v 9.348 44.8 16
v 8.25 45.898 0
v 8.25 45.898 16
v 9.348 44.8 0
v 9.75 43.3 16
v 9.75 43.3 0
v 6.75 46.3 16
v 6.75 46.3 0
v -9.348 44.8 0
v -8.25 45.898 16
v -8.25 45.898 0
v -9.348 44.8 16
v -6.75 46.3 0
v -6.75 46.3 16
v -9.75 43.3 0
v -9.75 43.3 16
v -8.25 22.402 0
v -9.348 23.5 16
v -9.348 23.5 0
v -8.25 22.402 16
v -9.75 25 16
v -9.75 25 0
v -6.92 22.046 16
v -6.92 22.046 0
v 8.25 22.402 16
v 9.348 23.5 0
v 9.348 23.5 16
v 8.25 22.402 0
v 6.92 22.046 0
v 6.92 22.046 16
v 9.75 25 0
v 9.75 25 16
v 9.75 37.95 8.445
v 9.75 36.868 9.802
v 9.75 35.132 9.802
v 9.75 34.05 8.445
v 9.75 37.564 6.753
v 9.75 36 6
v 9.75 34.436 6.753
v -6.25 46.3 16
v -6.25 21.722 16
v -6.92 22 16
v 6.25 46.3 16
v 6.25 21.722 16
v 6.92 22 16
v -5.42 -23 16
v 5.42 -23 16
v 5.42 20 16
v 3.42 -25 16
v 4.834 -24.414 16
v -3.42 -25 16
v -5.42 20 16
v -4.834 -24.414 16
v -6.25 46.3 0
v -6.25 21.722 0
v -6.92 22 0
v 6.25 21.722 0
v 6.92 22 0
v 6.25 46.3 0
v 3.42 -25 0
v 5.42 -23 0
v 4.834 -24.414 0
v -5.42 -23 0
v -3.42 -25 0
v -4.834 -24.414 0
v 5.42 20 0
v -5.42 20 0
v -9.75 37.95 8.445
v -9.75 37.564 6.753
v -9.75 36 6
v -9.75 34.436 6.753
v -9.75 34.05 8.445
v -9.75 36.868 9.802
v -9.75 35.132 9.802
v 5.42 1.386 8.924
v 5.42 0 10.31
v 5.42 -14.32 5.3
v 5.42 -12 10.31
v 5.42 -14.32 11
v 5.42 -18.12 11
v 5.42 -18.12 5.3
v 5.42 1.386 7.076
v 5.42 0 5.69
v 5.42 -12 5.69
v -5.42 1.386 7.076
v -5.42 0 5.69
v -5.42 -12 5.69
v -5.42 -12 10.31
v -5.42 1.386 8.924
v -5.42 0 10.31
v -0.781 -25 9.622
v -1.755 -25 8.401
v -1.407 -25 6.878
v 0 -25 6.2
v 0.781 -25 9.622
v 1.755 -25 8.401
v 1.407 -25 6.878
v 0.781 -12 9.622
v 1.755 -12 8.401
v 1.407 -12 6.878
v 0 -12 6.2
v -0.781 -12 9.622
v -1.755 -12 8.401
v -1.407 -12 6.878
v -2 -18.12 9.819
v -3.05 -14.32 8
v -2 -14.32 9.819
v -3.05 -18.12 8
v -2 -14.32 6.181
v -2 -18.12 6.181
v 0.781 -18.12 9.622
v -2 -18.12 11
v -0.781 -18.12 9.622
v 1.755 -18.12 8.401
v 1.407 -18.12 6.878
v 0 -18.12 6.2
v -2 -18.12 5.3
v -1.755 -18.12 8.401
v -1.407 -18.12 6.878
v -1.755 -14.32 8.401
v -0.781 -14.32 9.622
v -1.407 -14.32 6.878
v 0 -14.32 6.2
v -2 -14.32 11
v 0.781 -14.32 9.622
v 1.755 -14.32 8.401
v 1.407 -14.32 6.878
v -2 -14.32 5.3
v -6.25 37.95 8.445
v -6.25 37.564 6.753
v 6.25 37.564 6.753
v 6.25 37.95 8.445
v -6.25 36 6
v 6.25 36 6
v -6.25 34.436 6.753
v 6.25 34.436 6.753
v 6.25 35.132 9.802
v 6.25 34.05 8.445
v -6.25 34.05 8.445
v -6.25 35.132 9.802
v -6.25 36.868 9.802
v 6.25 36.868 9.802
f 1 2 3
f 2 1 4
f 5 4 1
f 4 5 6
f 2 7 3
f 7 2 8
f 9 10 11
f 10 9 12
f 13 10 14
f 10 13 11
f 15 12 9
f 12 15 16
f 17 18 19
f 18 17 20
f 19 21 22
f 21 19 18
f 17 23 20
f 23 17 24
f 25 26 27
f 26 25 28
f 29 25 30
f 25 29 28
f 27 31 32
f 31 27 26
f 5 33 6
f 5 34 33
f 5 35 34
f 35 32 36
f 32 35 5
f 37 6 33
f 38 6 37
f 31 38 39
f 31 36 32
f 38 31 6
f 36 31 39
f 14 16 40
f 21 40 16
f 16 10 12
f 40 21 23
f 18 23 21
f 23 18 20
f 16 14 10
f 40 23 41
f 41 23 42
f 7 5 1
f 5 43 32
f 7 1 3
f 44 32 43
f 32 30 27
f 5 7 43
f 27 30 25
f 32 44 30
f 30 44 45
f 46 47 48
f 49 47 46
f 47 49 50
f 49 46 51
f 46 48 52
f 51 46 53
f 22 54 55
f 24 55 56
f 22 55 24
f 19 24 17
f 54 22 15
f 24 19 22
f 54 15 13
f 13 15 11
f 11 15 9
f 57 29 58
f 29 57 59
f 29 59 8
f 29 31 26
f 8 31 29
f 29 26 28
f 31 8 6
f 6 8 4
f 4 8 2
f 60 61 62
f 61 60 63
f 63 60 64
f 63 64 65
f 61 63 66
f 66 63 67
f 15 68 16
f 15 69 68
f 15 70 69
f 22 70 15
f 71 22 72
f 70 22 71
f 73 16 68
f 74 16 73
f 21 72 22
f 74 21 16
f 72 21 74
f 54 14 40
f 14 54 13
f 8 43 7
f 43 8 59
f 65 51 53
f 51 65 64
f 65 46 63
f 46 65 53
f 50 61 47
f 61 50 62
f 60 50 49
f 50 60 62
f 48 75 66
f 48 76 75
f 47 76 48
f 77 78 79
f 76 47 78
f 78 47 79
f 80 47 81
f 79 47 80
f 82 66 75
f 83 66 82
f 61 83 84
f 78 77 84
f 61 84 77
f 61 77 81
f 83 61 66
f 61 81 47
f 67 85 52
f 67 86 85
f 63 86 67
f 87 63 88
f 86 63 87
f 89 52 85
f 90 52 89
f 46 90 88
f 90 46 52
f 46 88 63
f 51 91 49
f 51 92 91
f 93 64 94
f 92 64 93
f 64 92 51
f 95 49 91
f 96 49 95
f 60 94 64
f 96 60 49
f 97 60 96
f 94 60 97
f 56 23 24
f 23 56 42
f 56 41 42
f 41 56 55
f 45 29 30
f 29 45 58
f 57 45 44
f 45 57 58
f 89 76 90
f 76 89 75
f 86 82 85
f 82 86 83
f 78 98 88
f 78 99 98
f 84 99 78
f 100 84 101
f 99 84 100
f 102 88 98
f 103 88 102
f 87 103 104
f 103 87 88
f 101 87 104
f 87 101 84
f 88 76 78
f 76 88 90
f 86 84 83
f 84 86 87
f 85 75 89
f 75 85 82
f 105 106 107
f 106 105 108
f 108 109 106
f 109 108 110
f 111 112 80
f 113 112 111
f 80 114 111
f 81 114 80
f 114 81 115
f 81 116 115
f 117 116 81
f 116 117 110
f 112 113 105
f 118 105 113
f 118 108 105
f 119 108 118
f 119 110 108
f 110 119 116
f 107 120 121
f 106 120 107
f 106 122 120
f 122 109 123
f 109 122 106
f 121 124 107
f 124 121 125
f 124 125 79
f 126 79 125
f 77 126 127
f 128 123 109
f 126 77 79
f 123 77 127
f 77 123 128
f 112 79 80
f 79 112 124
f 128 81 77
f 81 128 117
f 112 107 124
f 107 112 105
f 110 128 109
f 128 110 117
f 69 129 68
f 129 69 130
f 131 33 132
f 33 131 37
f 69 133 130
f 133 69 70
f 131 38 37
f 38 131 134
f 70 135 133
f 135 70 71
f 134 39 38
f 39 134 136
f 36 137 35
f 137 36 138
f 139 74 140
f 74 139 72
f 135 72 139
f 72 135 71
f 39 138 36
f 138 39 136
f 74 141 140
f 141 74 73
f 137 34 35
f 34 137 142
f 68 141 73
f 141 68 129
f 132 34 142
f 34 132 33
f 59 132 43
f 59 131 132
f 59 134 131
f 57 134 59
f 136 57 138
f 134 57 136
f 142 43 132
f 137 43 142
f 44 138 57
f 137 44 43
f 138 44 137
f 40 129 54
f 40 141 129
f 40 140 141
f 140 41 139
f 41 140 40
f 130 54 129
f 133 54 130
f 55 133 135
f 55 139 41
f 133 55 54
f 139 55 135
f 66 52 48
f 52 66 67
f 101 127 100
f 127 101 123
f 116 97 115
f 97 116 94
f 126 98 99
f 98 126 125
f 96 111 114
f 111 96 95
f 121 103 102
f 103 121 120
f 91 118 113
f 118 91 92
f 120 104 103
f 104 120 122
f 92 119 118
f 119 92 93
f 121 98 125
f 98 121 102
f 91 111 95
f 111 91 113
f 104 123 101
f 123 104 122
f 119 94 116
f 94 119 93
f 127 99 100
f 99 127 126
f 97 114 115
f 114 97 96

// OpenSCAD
// file: inc/settings.scad
// Moved from config.scad
//calculated from settings
single_wall_width = width_over_thickness * layer_height;
//deltas are used to enlarge parts for bigger bearings, depends on outer bushing radius
//7.7 here is outer radius of lm8uu
xy_delta = max(0, bushing_xy[1] - 7.7, bushing_carriage[1] - 7.7);
z_delta = max(0, bushing_z[1] - 7.7);
x_to_z_distance = max(bushing_xy[0],bushing_carriage[0]) + bushing_z[1] + 3;
//distance of X axis rods, center to center
xaxis_rod_distance = 45 + xy_delta * 2;

// height and width of the x blocks depend on x smooth rod radius
x_box_height = xaxis_rod_distance + 8 + 2 * bushing_xy[0];
// Pretend the smooth rods are at least 8mm diameter
x_box_width = max(8, bushing_xy[0] * 2, bushing_carriage[0] * 2) + 10;

// distance between centers of z threaded and smooth rod, in X direction
z_pair_separation = max(bushing_outer_radius(bushing_z) + 8, 18);

idler_width = max(belt_width, idler_bearing[1], 7) + 2.5 * idler_bearing[3];

//Required clearence from X axis center to board wrt carriage
carriage_thickness = max(bushing_outer_radius(bushing_xy), bushing_outer_radius(bushing_carriage));
//move the XZ plane further away from board for bigger bearings
board_to_x_distance = max(carriage_thickness, x_box_width / 2) + 2;

m3_nut_diameter_bigger = ((m3_nut_diameter / 2) / cos (180 / 6)) * 2;
idler_height=max(idler_bearing[0], 16);
// file: inc/functions.scad
// PRUSA iteration3
// Functions used in many files
// GNU GPL v3
// Josef Průša <josefprusa@me.com>
// Václav 'ax' Hůla <axtheb@gmail.com>
// Vlnofka <>
// http://www.reprap.org/wiki/Prusa_Mendel
// http://github.com/josefprusa/Prusa3


module nut(d,h,horizontal=true){
    cornerdiameter =  (d / 2) / cos (180 / 6);
    cylinder(h = h, r = cornerdiameter, $fn = 6);
    if(horizontal){
        for(i = [1:6]){
            rotate([0,0,60*i]) translate([-cornerdiameter-0.2,0,0]) rotate([0,0,-45]) cube([2,2,h]);
        }
    }
}

module fillet(radius, height=100, $fn=0) {
    //this creates acutal fillet
    translate([-radius, -radius, -height / 2 - 0.02]) difference() {
        cube([radius * 2, radius * 2, height + 0.04]);
        if ($fn == 0 && (radius == 2 || radius == 3 || radius == 4)) {
            cylinder(r=radius, h=height + 0.04, $fn=4 * radius);
        } else {
            cylinder(r=radius, h=height + 0.04, $fn=$fn);
        }

    }
}

module cube_fillet(size, radius=-1, vertical=[3,3,3,3], top=[0,0,0,0], bottom=[0,0,0,0], center=false, $fn=0){
    //
    if (use_fillets == 1) {
        if (center) {
            cube_fillet_inside(size, radius, vertical, top, bottom, $fn);
        } else {
            translate([size[0]/2, size[1]/2, size[2]/2])
                cube_fillet_inside(size, radius, vertical, top, bottom, $fn);
        }
    } else {
        if (use_fillets == 2) {
            if (center) {
                cube_fillet_inside(size, radius, vertical, top, bottom, 4);
            } else {
                translate([size[0]/2, size[1]/2, size[2]/2])
                    cube_fillet_inside(size, radius, vertical, top, bottom, 4);
            }

        } else {
            cube(size, center);
        }
    }

}

module cube_negative_fillet(size, radius=-1, vertical=[3,3,3,3], top=[0,0,0,0], bottom=[0,0,0,0], $fn=0){

    j=[1,0,1,0];

    for (i=[0:3]) {
        if (radius > -1) {
            rotate([0, 0, 90*i]) translate([size[1-j[i]]/2, size[j[i]]/2, 0]) fillet(radius, size[2], $fn=$fn);
        } else {
            rotate([0, 0, 90*i]) translate([size[1-j[i]]/2, size[j[i]]/2, 0]) fillet(vertical[i], size[2], $fn=$fn);
        }
        rotate([90*i, -90, 0]) translate([size[2]/2, size[j[i]]/2, 0 ]) fillet(top[i], size[1-j[i]], $fn=$fn);
        rotate([90*(4-i), 90, 0]) translate([size[2]/2, size[j[i]]/2, 0]) fillet(bottom[i], size[1-j[i]], $fn=$fn);

    }
}

module cube_fillet_inside(size, radius=-1, vertical=[3,3,3,3], top=[0,0,0,0], bottom=[0,0,0,0], $fn=0){
    //makes CENTERED cube with round corners
    // if you give it radius, it will fillet vertical corners.
    //othervise use vertical, top, bottom arrays
    //when viewed from top, it starts in upper right corner (+x,+y quadrant) , goes counterclockwise
    //top/bottom fillet starts in direction of Y axis and goes CCW too


    if (radius == 0) {
        cube(size, center=true);
    } else {
        difference() {
            cube(size, center=true);
            cube_negative_fillet(size, radius, vertical, top, bottom, $fn);
        }
    }
}


module nema17(places=[1,1,1,1], size=15.5, h=10, holes=false, shadow=false, $fn=24){
    for (i=[0:3]) {
        if (places[i] == 1) {
            rotate([0, 0, 90*i]) translate([size, size, 0]) {
                if (holes) {
                    rotate([0, 0, -90*i])  translate([0,0,-10]) screw(r=1.7, slant=false, head_drop=13, $fn=$fn, h=h+12);
                } else {
                    rotate([0, 0, -90*i]) cylinder(h=h, r=5.5, $fn=$fn);
                }
            }
        }
    }
    if (shadow != false) {
        %translate ([0, 0, shadow+21+3]) cube([42,42,42], center = true);
    //flange
        %translate ([0, 0, shadow+21+3-21-1]) cylinder(r=11,h=2, center = true, $fn=20);
    //shaft
        %translate ([0, 0, shadow+21+3-21-7]) cylinder(r=2.5,h=14, center = true);
    }
}

module screw(h=20, r=2, r_head=3.5, head_drop=0, slant=i_am_box, poly=false, $fn=0){
    //makes screw with head
    //for substraction as screw hole
    if (poly) {
        cylinder_poly(h=h, r=r, $fn=$fn);
    } else {
        cylinder(h=h, r=r, $fn=$fn);
    }
    if (slant) {
        translate([0, 0, head_drop-0.01]) cylinder(h=r_head, r2=0, r1=r_head, $fn=$fn);
    }

    if (head_drop > 0) {
        translate([0, 0, -0.01]) cylinder(h=head_drop+0.01, r=r_head, $fn=$fn);
    }
}

module plate_screw(long=0) {
    if (i_am_box == 0) {
        translate([0, 0, -long]) screw(head_drop=14 + long, h=30 + long, r_head=3.6, r=1.7, $fn=24, slant=false);
    } else {
        translate([0, 0, -2 - long]) screw(head_drop=14 + long, h=30 + long, r_head=4.5, r=2, $fn=24, slant=true);
    }
}

//radius of the idler assembly (to surface that touches belt, ignoring guide walls)
function idler_assy_r_inner(idler_bearing) = (idler_bearing[0] / 2) + (6 * single_wall_width + 0.2) * idler_bearing[3];
//outer radius of the idler assembly (to smooth side of belt) 
function idler_assy_r_outer(idler_bearing) = idler_assy_r_inner(idler_bearing) + belt_thickness + 1;


module idler_assy(idler_bearing = [22, 7, 8, 1]) {

    //bearing axle
    translate([0,0,-1]) cylinder(h = 120, r=(idler_bearing[2] + 1) / 2, $fn=small_hole_segments, center=true);
    //bearing shadow
    %cylinder(h = idler_bearing[1], r=idler_bearing[0]/2, center=true);
    //belt shadow
    %cylinder(h = belt_width, r=idler_assy_r_outer(idler_bearing), center=true);

    cylinder(h = idler_width + 1, r=idler_assy_r_outer(idler_bearing) + 0.5, center=true);
}

module belt(len, side = 0){
    //belt. To be substracted from model
    //len is in +Z, smooth side in +X, Y centered
    translate([-0.5, 0, 0]) maketeeth(len);
    translate([0, -4.5, -0.01]) cube([belt_thickness, 9, len + 0.02]);
    if (side != 0) {
    translate([0, -4.5 + side, -0.01]) cube_fillet([belt_thickness, 9, len + 0.02], vertical = [3, 0, 0, 0]);
    }
}


module maketeeth(len){
    //Belt teeth. 
    for (i = [0 : len / belt_tooth_distance]) {
        translate([0, 0, i * belt_tooth_distance]) cube([2, 9, belt_tooth_distance * belt_tooth_ratio], center = true);
    }
}


module cylinder_pushfit(r,h, center=false){
    //horizontal smooth hole opening
    trn = (center ? 0 : h/2);
    translate([0, 0, trn]) {
        cylinder(h=h, r=r, $fn=30, center=true);
        translate([0, -r / 2, 0]) cube_fillet([r * 2, r, h], vertical = [0, 0, 1.5, 1.5], center = true, $fn=4);
        translate([0, -r - 4 * layer_height, 0]) cube([r * 2 - 2, 1, h], center = true);
    }
}

function bushing_outer_radius(conf_b) = conf_b[1] + 4*single_wall_width;
// file: inc/conf_bushing.scad
// PRUSA iteration3
// Bushing and bering dimensions
// GNU GPL v3
// Václav 'ax' Hůla <axtheb@gmail.com>
// http://www.reprap.org/wiki/Prusa_Mendel
// http://github.com/josefprusa/Prusa3
//

// each config is in form[r_rod, r, h, type, name] where:
//     r_rod  is smooth rod radius [0]
//     r is outer bushing radius needed for tight fit or bearing radius with loose fit [1]
//     h is barrel length [2]
//     type is 0 for linear bearings, 1 is for bushings which needs to be enclosed fully. [3]
//       type 1 may have flange, but type 0 not
//     name is human readable name [4]

//bushings
conf_b_bushing8 = [4, 5.1, 10, 1, "Tube shaped bushing like igus J(V)FM 0810-10"];
conf_b_bushing10 = [5, 6.1, 10, 1, "Tube shaped bushing with id=10mm, od=12mm and length of at least 10mm, like J(V)FM 1012-10"];
conf_b_bushing12 = [6, 7.1, 15, 1, "Tube shaped bushing with id=12mm, od=14mm and length of at least 15mm, like SF-1 1215"];

conf_b_bronze8 = [4, 8, 11, 1, "bronze self-aligning bushing, 8mm"];

//shorter beaings (two on each Z axis)
conf_b_lm8uu = [4, 7.7, 24, 0, "lm8uu bearing (standard)"]; // otsakir: measured 7.47 but put some more for air 
conf_b_lm10uu = [5, 9.7, 29, 0, "lm10uu bearing (10mm smooth rod)"];
conf_b_lme8uu =[4, 8.2, 25, 0, "lme8uu bearing"];
conf_b_lm12uu = [6, 10.6, 30, 0, "lm12uu bearing (12mm smooth rod)"];

//longer bearings
conf_b_lm8luu = [4, 7.7, 45, 0, "lm8luu bearing (double length)"];
conf_b_lm10luu = [5, 9.7, 55, 0, "lm10luu bearing (10mm smooth rod, long)"];
conf_b_lm12luu = [6, 10.6, 57, 0, "lm12luu bearing (12mm, double length)"];


// Select idler bearing size **************************************************
// [outer_diameter, width, inner_diameter, uses_guide]

// roughly sorted by desirability

// one bearing with guides
// Select by availability, smaller is better.
bearing_623 = [10, 4, 3, 1, "623 bearing"];
bearing_624 = [13, 5, 4, 1, "624 bearing"];
bearing_625 = [16, 5, 5, 1, "625 bearing"];

// two bearings side by side - for use without bearing guides.
// Not recomended anymore
bearing_625_double = [16, 10, 5, 0, "625 bearing x2"];
bearing_624_double = [13, 10, 4, 0, "624 bearing x2"];
bearing_623_double = [10, 8, 3, 0, "623 bearing"];

// 608 [standard skate bearings] with bearing guide
bearing_608 = [22, 7, 8, 1, "608 bearing"];
// 608 bearings with fender washers.
// the belt brushes both against the carriage and the washers.
bearing_608_washers = [22, 10, 8, 0, "608 bearing"];
// file: inc/metric.scad
// PRUSA iteration3
// Default metric sizes
// GNU GPL v3
// Josef Průša <josefprusa@me.com>
// http://www.reprap.org/wiki/Prusa_Mendel
// http://github.com/prusajr/PrusaMendel

// DONT CHANGE THIS FILE! ALTER VALUES IN CONFIGURATION.SCAD INSTEAD

// RODS

threaded_rod_diameter = 8.7;
threaded_rod_diameter_horizontal = 8.7;
smooth_bar_diameter = 8;
smooth_bar_diameter_horizontal = 8.8;

// Nuts and bolts

m8_diameter = 9;
m8_nut_diameter = 14.1;

m4_diameter = 4.5;
m4_nut_diameter = 9;

m3_diameter = 3.6;
m3_nut_diameter = 5.3;
m3_nut_diameter_horizontal = 6.1;

// Bushing holder

bushing_core_diameter = smooth_bar_diameter;
bushing_material_thickness = 1;

// Motors

motor_shaft = 5.5;
// file: inc/bearing-guide.scad
// PRUSA iteration3
// Bearing guide
// GNU GPL v3
// Josef Průša <josefprusa@me.com>
// Václav 'ax' Hůla <axtheb@gmail.com>
// Original design by Greg Frost
// http://www.reprap.org/wiki/Prusa_Mendel
// http://github.com/prusajr/PrusaMendel


/**
 * Helps to hold belt aligned on the bearing.
 * @id bearing-guide
 * @name Bearing guide
 * @category Printed
 */

include <../configuration.scad>
include <functions.scad>

//guiding_wall_thickness of guiding wall
guiding_wall_thickness=layer_height * 3;


height = max(belt_width, idler_bearing[1]) + guiding_wall_thickness;
//How much the guiding wall overlaps the bearing wall (to the center)
wall_descent = 1;

module bearing_guide_inner(){
    //inner (smaller) part of the guide
    difference(){
        cylinder(r=idler_bearing[0] / 2 + single_wall_width * 3, h=height - (max( idler_bearing[1], belt_width) - idler_bearing[1]) / 2);
        translate([0, 0, -1])
            cylinder(r=idler_bearing[0] / 2, h=height + 2);
    }

    difference(){
        union() {
            cylinder(r=idler_assy_r_outer(idler_bearing), h=guiding_wall_thickness);  //guide wall
            cylinder(r=idler_bearing[0] / 2, h=guiding_wall_thickness + (belt_width - idler_bearing[1])/2);  //this centers the guide on bearing
        }
        translate([0,0,-1])
            cylinder(r=idler_bearing[0] / 2 - wall_descent, h=guiding_wall_thickness + 10);
    }
}

module bearing_guide_outer(){
    difference(){
        cylinder(r=idler_bearing[0] / 2 + 6 * single_wall_width + 0.2, h=height);
        translate([0,0,-1])
            cylinder(r=idler_bearing[0] / 2 + single_wall_width * 3, h=height + 2);
    }

    difference(){
        union(){
            cylinder(r=idler_assy_r_outer(idler_bearing), h=guiding_wall_thickness);
            cylinder(r=idler_bearing[0] / 2, h=guiding_wall_thickness + (belt_width - idler_bearing[1])/2);
        }
        translate([0,0,-1])
cylinder(r=idler_bearing[0]/2-wall_descent, h=height + 5);
    }
}

module bearing_assy(){

    bearing_guide_inner();
    translate([idler_assy_r_outer(idler_bearing) * 2 + 2, 0, 0])
        bearing_guide_outer();
}

bearing_assy();
// file: bushing.scad
// PRUSA Mendel  
// Bushings
// GNU GPL v3
// Josef Průša
// josefprusa@me.com
// prusadjs.cz
// http://www.reprap.org/wiki/Prusa_Mendel
// http://github.com/prusajr/PrusaMendel

include <configuration.scad>

/**
 * @id bushing
 * @name Bushing
 * @category Printed
 * @id bushing
 */ 



module bushing(stiff, lenght=11){
	difference(){
		union(){
			translate(v=[-7.5,-8,0])cube(size = [15,8,lenght]);
			cylinder(h = lenght, r=7.5);
		}
	//cutout inside
	//Opening
	rotate(a=[0,0,45]) translate(v=[1,1,-1]) cube(size = [16,16,lenght+2]);
	//Cutouts to make it more bendy
	if(stiff){
		translate(v=[-4.8,-6,-1]) cube(size = [0.8,6,lenght+2]);
		translate(v=[4,-6,-1]) cube(size = [0.8,6,lenght+2]);
	}else{
		translate(v=[-4.8,-8,-1]) cube(size = [0.8,8,lenght+2]);
		translate(v=[4,-8,-1]) cube(size = [0.8,8,lenght+2]);
	}
	translate(v=[0,5,(lenght+2)/2]) cube(size = [7,8,lenght+2], center=true);
	translate(v=[0,0,-1]) cylinder(h = lenght+2, r=5);
	}
}


module standart_bushing(){

difference(){translate(v=[0,5,8])rotate(a=[90,0,0]){
bushing(false, 10);
translate(v=[-7,-13,0])cube(size = [14,5,10]);
translate(v=[-2,-13,-3])cube(size = [4,5,16]);
translate(v=[-2,-12,-3])cube(size = [4,7.5,2]);
translate(v=[-2,-12,11])cube(size = [4,7.5,2]);
}
translate(v=[-3,-1,-16])rotate(a=[45,0,0])cube(size = [6,5,16]);

mirror([ 0, 1, 0 ]) translate(v=[-3,-1,-16])rotate(a=[45,0,0])cube(size = [6,5,16]);}
}


// Includes small cutouts for better prints
module vertical_bushing(stiff, lenght){
difference(){
bushing(stiff, lenght);
translate(v=[-5,0,-1]) cube(size = [10,2.5,lenght+2]);
}
}


//vertical_bushing(true, 11);

module z_bushings(){
// STUFF FOR X-ENDS
difference(){
// Slider.
translate([0,6.5,30]) 
cube([23,17,60],center=true);
// Slider cutout.
translate([0,10,32.5]) 
cube([17,17,70],center=true);
}
union(){translate([0,9.5,0])vertical_bushing(true,13);
	//translate([0,4,0.5])cube(size = [8,2,1], center = true);
	//translate([0,4,12.5])cube(size = [8,2,1], center = true);
	translate([0,9.5,48])vertical_bushing(true,13);
	//translate([0,4,48+0.5])cube(size = [8,2,1], center = true);
	//translate([0,4,48+12.5])cube(size = [8,2,1], center = true);
	translate([0,9.5,32])
	{
		difference()
		{
			bushing(true,16);
			translate([0,3,2]) 
			rotate([45,0,0])
			cube([16,30,16], center=true);
		}
	}
}
}

//z_bushings();
z_linear_bearings();


module z_linear_bearings(){
translate(v=[0,9.5,0]) rotate(a=[0,0,90]){
difference(){
union(){
//main block
translate(v=[-5,0,32.5]) cube(size = [10,20,65], center = true);
//holder for main block in x-end
translate(v=[-5,0,15.8/2]) cube(size = [12,23,15.8], center = true);
translate(v=[0,0,0]) cylinder(h = 65, r=10, $fn=60);
}
//main axis
translate(v=[0,0,-2]) cylinder(h = 70, r=7.7, $fn=50);
//main cut
translate(v=[10,0,32.5]) cube(size = [20,14,70], center = true);
//smooth entry cut
translate(v=[12,0,32.5]) rotate(a=[0,0,45]) cube(size = [20,20,70], center = true);
translate(v=[0,0,14.5+2]) ziptie();
translate(v=[0,0,65-(12+2)-5]) ziptie();
}
translate(v=[-(10-5.5)/2-5.5,0,0+1]) cube(size = [10-5.5,20,2], center = true);
translate(v=[-(10-5.5)/2-5.5,0,24.5+2+1]) cube(size = [10-5.5,20,2], center = true);

translate(v=[-(10-5.5)/2-5.5,0,65-1]) cube(size = [10-5.5,20,2], center = true);
translate(v=[-(10-5.5)/2-5.5,0,65-24.5-2-1]) cube(size = [10-5.5,20,2], center = true);
}
}

module ziptie(){
difference(){
translate(v=[0,0,0]) cylinder(h = 3.9, r=10.3);
translate(v=[0,0,0]) cylinder(h = 5, r=10-1, $fn=50);
translate(v=[0,0,3]) cylinder(h = 1, r1=10-1, r2=10.2, $fn=50);
}}


// Gregs
clearance=0.7;

lm8uu_diameter=16+clearance;
lm8uu_length=25+clearance;
lm8uu_support_thickness=3.2; 
lm8uu_end_diameter=m8_diameter+1.5;

lm8uu_holder_width=lm8uu_diameter+2*lm8uu_support_thickness;
lm8uu_holder_length=lm8uu_length+2*lm8uu_support_thickness;
lm8uu_holder_height=lm8uu_diameter*0.75+lm8uu_support_thickness;
lm8uu_holder_gap=(lm8uu_holder_length-6*lm8uu_support_thickness)/2;

module lm8uu_bearing_holder()
{
	translate([-lm8uu_holder_width/2,-lm8uu_holder_length/2,-5])difference()
	{
		cube([lm8uu_holder_width,lm8uu_holder_length,lm8uu_holder_height]);
		translate([lm8uu_holder_width/2,0,lm8uu_holder_width/2])
		rotate([-90,0,0])
		translate([0,0,5])
		cylinder(r=lm8uu_diameter/2,h=lm8uu_length,$fn=40);

		translate([lm8uu_holder_width/2,0,lm8uu_holder_width/2])
		rotate([-90,0,0])
		translate([0,0,-1])
		{
			cylinder(r=lm8uu_end_diameter/2,h=lm8uu_holder_length+2,$fn=40);
			translate([-lm8uu_end_diameter/2,-lm8uu_end_diameter,0])
			cube([lm8uu_end_diameter,lm8uu_end_diameter,lm8uu_holder_length+2]);
		}

		translate([-1,2*lm8uu_support_thickness,lm8uu_support_thickness])
		cube([lm8uu_holder_width+2,lm8uu_holder_gap,
			lm8uu_holder_height-lm8uu_support_thickness+1]);

		translate([-1,4*lm8uu_support_thickness+lm8uu_holder_gap,
			lm8uu_support_thickness])
		cube([lm8uu_holder_width+2,lm8uu_holder_gap,
			lm8uu_holder_height-lm8uu_support_thickness+1]);
	}
}	

module lm8uu_bearing_cut()
	{
		translate([-lm8uu_holder_width/2,-lm8uu_holder_length/2,-5])cube([lm8uu_holder_width,lm8uu_holder_length,lm8uu_holder_height]);
	}
// file: configuration.scad
// PRUSA iteration3
// Configuration file
// GNU GPL v3
// Josef Průša <josefprusa@me.com>
// Václav 'ax' Hůla <axtheb@gmail.com>
// http://www.reprap.org/wiki/Prusa_Mendel
// http://github.com/josefprusa/Prusa3

include <inc/metric.scad>;
include <inc/conf_bushing.scad>;

// Custom settings here, tailor to your supplies and print settings

// Extruder settings **********************************************************
// Don't forget to set your slicer's extruder settings to match the values you
// enter here.

layer_height = 0.3;
// Width over thickness determines how wide the plastic will be when extruded
// onto the object that is being printed. width_over_thickness is multiplied
// by the layer_height to calculate this width. i.e. If your layer_height is
// set to 0.3 mm and your width_over_thickness is set to 2.2, the resulting
// width will be 0.66 mm.
width_over_thickness = 2.2;

// Select your belt type ******************************************************

// T2.5
//belt_width = 6.5;  //add 0.5 to actual width
//belt_tooth_distance = 2.5;
//belt_tooth_ratio = 0.75;
//belt_thickness = 0.8;

// T5 (strongly discouraged)
//belt_width = 6.5;
//belt_tooth_distance = 5;
//belt_tooth_ratio = 0.75;
//belt_thickness = 0.8;

// HTD3
//belt_width = 9.5;
//belt_tooth_distance = 3;
//belt_tooth_ratio = 0.75;
//belt_thickness = 1.75;

// MXL
//belt_width = 6.5;
//belt_tooth_distance = 2.032;
//belt_tooth_ratio = 0.64;
//belt_thickness = i have no idea;

// GT2 
// there is bunch of GT2 belts with different tooth-to-tooth distance
// this one is most common in reprap world
// adjust to your needs.
belt_width = 6.5;
belt_tooth_distance = 2;
belt_tooth_ratio = 0.5;
belt_thickness = 0.8;

// Choose bearing/bushing configuration ***************************************
// conf_b_* are in inc/conf_bushing.scad

bushing_xy = conf_b_lm8uu;
bushing_z = conf_b_lm8uu;
// for longer bearings use one shorter in x-carriage to make place for belt attachment
// by default use same as xy
bushing_carriage = bushing_xy;


// Select idler bearing size **************************************************
// bearing_* are in inc/conf_bushing.scad

idler_bearing = bearing_623;

// Select carriage lenght ******************************************************
// 30 for single carriage extruder (two holes with centers 30mm apart)
// 50 for wade or single with fan (three holes, 30-20)
// 80 for full length carriage (four holes, 30-20-30)

carriage_l_base = 50;


// Fillets ********************************************************************
// fillets are rounded corners of boxes. The right engineering term is probably radius
// but cad software calls it fillet.
// mostly cosmetic, except z axis.
// 0 = no fillets
// 1 = fillet
// 2 = chamfer (cut the edges at 45deg. angle)
// Please do put only parts with fillets on sale, other options are not really tested

use_fillets = 1;

// set to 0 for single plate (affects z axis and screws that attach RP parts to frame)
i_am_box = 1;

// if you do your own plate and can move bottom Z screws 5mm up set this to 0 to
// get stronger motor mount. Only for i_am_box = 0
i_want_to_use_single_plate_dxf_and_make_my_z_weaker = 1;


// Radius of long threaded rod on Y frame

// Affects y-axis-corner (both box and single plate)
// and y-axis-bracket (box only)

//Use 5.4 for M10 or 4.4 for M8
y_threaded_rod_long_r = 5.4;


// Thickness of the boards that make the box frame.

// in y-axis-corner it governs the height of the corners by adjusting the
// distance between ground and M10 threaded rod. (both box and single plate)

// For box model, the parts that hold Z smooth rod have one hole from front
// and one from side, and this setting makes sure that the screw from side
// is in the center of the plank.

// Use 12 for single plate
// or 20 if you want to use the Y lm8uu holders
// (extras/bearing-holder-single-plate-y)
board_thickness = 12;

// Segments of small holes. some poeple claim that a low value makes them easier to print.
small_hole_segments=7;

// functions
include <inc/functions.scad>;
include <inc/settings.scad>;

// These constants define the geometry of the doc/complete-printer.scad
bed_x_size=225;
bed_y_size=225;
x_smooth_rod_length=380+board_thickness*2;
y_smooth_rod_length=400;
z_smooth_rod_length=320;
// main file
// PRUSA iteration3
// X ends
// GNU GPL v3
// Josef Průša <josefprusa@me.com>
// Václav 'ax' Hůla <axtheb@gmail.com>
// http://www.reprap.org/wiki/Prusa_Mendel
// http://github.com/josefprusa/Prusa3

// ThingDoc entry
/**
 * @id xMotorEnd
 * @name X Axis Motor End
 * @category Printed
 */
 
/**
 * @id xIdlerEnd
 * @name X Axis Idler End
 * @category Printed
 */
 
include <configuration.scad>
use <bushing.scad>
use <inc/bearing-guide.scad>



module oval(r=4, l=14, h=2){
    intersection() {
        union() {
            translate([l / 2, 0, 0]) cylinder(r=r, h=h, $fn=4);
            //translate([-l / 2, 0, 0]) cylinder(r=r, h=h, $fn=4);
            translate([0, 0, h / 2]) cube([l, r * 2, h], center=true);
        }
        translate([0, 0, h / 2]) cube([l + r * 1.2, r * 2, h], center=true);
    }
}

module idlermount(len=45, narrow_len=0, narrow_width=0, rod=threaded_rod_diameter_horizontal / 2, idler_height=16){
    difference(){
        union(){
            //wide part holding bearing
            translate([- (10 + idler_width) / 2, -25 + narrow_len, 0] ) cube_fillet([10 + idler_width, len + idler_bearing[2] * 1.1 - narrow_len, idler_height]);
            //For X there is narrow part inside the x-idler
            if (narrow_len > 0){
                translate([-narrow_width / 2, -25, 0] ) cube_fillet([narrow_width, len + idler_bearing[2], idler_height], vertical=[0, 0, 2, 2]);
                mirror([1, 0, 0]) translate([-narrow_width / 2, narrow_len -25, idler_height / 2 ]) fillet(1.5, idler_height - 0.04, $fn=8);
                translate([-narrow_width / 2, narrow_len -25, idler_height / 2]) fillet(1.5, idler_height - 0.04, $fn=8);
            }
        }
        translate([-12, -6, idler_height / 2]) rotate([90, 0, 90]) oval(r=rod + 0.01, l=12, h=25);
        translate([0, -13 - single_wall_width*2, idler_height / 2]) {
            // nut for tensioning screw
            translate([0,0,0]) rotate([90, 0, 0]) cylinder(r=m3_nut_diameter_horizontal / 2, h=3.8, $fn=6);
            // nut insert
            translate([-2, -3.8, -m3_diameter * 1.5 / 2]) cube([20, 3.8, m3_diameter * 1.5+0.3]);
        }

        // tensioning screw goes here
        translate([0, -19, idler_height / 2]) rotate([90, 90, 0]) cylinder(r=m3_diameter / 2, h=15, $fn=small_hole_segments, center=true);
        // bearing goes there
        translate([0, len + idler_bearing[2] - 35, idler_height / 2]) {
            rotate([0, 90, 0]) idler_assy(idler_bearing);
            translate([0, 10, 0]) cube([idler_width + 3, 52, idler_height + 2], center=true);
        }

    }
}





module x_tensioner(len=68, idler_height=max(idler_bearing[0], 16)) {
    idlermount(len=len, 
               rod=m3_diameter / 2 + 0.5, 
               idler_height=idler_height, 
               narrow_len=47, 
               narrow_width=idler_width + 2 - single_wall_width);
}


x_tensioner();
